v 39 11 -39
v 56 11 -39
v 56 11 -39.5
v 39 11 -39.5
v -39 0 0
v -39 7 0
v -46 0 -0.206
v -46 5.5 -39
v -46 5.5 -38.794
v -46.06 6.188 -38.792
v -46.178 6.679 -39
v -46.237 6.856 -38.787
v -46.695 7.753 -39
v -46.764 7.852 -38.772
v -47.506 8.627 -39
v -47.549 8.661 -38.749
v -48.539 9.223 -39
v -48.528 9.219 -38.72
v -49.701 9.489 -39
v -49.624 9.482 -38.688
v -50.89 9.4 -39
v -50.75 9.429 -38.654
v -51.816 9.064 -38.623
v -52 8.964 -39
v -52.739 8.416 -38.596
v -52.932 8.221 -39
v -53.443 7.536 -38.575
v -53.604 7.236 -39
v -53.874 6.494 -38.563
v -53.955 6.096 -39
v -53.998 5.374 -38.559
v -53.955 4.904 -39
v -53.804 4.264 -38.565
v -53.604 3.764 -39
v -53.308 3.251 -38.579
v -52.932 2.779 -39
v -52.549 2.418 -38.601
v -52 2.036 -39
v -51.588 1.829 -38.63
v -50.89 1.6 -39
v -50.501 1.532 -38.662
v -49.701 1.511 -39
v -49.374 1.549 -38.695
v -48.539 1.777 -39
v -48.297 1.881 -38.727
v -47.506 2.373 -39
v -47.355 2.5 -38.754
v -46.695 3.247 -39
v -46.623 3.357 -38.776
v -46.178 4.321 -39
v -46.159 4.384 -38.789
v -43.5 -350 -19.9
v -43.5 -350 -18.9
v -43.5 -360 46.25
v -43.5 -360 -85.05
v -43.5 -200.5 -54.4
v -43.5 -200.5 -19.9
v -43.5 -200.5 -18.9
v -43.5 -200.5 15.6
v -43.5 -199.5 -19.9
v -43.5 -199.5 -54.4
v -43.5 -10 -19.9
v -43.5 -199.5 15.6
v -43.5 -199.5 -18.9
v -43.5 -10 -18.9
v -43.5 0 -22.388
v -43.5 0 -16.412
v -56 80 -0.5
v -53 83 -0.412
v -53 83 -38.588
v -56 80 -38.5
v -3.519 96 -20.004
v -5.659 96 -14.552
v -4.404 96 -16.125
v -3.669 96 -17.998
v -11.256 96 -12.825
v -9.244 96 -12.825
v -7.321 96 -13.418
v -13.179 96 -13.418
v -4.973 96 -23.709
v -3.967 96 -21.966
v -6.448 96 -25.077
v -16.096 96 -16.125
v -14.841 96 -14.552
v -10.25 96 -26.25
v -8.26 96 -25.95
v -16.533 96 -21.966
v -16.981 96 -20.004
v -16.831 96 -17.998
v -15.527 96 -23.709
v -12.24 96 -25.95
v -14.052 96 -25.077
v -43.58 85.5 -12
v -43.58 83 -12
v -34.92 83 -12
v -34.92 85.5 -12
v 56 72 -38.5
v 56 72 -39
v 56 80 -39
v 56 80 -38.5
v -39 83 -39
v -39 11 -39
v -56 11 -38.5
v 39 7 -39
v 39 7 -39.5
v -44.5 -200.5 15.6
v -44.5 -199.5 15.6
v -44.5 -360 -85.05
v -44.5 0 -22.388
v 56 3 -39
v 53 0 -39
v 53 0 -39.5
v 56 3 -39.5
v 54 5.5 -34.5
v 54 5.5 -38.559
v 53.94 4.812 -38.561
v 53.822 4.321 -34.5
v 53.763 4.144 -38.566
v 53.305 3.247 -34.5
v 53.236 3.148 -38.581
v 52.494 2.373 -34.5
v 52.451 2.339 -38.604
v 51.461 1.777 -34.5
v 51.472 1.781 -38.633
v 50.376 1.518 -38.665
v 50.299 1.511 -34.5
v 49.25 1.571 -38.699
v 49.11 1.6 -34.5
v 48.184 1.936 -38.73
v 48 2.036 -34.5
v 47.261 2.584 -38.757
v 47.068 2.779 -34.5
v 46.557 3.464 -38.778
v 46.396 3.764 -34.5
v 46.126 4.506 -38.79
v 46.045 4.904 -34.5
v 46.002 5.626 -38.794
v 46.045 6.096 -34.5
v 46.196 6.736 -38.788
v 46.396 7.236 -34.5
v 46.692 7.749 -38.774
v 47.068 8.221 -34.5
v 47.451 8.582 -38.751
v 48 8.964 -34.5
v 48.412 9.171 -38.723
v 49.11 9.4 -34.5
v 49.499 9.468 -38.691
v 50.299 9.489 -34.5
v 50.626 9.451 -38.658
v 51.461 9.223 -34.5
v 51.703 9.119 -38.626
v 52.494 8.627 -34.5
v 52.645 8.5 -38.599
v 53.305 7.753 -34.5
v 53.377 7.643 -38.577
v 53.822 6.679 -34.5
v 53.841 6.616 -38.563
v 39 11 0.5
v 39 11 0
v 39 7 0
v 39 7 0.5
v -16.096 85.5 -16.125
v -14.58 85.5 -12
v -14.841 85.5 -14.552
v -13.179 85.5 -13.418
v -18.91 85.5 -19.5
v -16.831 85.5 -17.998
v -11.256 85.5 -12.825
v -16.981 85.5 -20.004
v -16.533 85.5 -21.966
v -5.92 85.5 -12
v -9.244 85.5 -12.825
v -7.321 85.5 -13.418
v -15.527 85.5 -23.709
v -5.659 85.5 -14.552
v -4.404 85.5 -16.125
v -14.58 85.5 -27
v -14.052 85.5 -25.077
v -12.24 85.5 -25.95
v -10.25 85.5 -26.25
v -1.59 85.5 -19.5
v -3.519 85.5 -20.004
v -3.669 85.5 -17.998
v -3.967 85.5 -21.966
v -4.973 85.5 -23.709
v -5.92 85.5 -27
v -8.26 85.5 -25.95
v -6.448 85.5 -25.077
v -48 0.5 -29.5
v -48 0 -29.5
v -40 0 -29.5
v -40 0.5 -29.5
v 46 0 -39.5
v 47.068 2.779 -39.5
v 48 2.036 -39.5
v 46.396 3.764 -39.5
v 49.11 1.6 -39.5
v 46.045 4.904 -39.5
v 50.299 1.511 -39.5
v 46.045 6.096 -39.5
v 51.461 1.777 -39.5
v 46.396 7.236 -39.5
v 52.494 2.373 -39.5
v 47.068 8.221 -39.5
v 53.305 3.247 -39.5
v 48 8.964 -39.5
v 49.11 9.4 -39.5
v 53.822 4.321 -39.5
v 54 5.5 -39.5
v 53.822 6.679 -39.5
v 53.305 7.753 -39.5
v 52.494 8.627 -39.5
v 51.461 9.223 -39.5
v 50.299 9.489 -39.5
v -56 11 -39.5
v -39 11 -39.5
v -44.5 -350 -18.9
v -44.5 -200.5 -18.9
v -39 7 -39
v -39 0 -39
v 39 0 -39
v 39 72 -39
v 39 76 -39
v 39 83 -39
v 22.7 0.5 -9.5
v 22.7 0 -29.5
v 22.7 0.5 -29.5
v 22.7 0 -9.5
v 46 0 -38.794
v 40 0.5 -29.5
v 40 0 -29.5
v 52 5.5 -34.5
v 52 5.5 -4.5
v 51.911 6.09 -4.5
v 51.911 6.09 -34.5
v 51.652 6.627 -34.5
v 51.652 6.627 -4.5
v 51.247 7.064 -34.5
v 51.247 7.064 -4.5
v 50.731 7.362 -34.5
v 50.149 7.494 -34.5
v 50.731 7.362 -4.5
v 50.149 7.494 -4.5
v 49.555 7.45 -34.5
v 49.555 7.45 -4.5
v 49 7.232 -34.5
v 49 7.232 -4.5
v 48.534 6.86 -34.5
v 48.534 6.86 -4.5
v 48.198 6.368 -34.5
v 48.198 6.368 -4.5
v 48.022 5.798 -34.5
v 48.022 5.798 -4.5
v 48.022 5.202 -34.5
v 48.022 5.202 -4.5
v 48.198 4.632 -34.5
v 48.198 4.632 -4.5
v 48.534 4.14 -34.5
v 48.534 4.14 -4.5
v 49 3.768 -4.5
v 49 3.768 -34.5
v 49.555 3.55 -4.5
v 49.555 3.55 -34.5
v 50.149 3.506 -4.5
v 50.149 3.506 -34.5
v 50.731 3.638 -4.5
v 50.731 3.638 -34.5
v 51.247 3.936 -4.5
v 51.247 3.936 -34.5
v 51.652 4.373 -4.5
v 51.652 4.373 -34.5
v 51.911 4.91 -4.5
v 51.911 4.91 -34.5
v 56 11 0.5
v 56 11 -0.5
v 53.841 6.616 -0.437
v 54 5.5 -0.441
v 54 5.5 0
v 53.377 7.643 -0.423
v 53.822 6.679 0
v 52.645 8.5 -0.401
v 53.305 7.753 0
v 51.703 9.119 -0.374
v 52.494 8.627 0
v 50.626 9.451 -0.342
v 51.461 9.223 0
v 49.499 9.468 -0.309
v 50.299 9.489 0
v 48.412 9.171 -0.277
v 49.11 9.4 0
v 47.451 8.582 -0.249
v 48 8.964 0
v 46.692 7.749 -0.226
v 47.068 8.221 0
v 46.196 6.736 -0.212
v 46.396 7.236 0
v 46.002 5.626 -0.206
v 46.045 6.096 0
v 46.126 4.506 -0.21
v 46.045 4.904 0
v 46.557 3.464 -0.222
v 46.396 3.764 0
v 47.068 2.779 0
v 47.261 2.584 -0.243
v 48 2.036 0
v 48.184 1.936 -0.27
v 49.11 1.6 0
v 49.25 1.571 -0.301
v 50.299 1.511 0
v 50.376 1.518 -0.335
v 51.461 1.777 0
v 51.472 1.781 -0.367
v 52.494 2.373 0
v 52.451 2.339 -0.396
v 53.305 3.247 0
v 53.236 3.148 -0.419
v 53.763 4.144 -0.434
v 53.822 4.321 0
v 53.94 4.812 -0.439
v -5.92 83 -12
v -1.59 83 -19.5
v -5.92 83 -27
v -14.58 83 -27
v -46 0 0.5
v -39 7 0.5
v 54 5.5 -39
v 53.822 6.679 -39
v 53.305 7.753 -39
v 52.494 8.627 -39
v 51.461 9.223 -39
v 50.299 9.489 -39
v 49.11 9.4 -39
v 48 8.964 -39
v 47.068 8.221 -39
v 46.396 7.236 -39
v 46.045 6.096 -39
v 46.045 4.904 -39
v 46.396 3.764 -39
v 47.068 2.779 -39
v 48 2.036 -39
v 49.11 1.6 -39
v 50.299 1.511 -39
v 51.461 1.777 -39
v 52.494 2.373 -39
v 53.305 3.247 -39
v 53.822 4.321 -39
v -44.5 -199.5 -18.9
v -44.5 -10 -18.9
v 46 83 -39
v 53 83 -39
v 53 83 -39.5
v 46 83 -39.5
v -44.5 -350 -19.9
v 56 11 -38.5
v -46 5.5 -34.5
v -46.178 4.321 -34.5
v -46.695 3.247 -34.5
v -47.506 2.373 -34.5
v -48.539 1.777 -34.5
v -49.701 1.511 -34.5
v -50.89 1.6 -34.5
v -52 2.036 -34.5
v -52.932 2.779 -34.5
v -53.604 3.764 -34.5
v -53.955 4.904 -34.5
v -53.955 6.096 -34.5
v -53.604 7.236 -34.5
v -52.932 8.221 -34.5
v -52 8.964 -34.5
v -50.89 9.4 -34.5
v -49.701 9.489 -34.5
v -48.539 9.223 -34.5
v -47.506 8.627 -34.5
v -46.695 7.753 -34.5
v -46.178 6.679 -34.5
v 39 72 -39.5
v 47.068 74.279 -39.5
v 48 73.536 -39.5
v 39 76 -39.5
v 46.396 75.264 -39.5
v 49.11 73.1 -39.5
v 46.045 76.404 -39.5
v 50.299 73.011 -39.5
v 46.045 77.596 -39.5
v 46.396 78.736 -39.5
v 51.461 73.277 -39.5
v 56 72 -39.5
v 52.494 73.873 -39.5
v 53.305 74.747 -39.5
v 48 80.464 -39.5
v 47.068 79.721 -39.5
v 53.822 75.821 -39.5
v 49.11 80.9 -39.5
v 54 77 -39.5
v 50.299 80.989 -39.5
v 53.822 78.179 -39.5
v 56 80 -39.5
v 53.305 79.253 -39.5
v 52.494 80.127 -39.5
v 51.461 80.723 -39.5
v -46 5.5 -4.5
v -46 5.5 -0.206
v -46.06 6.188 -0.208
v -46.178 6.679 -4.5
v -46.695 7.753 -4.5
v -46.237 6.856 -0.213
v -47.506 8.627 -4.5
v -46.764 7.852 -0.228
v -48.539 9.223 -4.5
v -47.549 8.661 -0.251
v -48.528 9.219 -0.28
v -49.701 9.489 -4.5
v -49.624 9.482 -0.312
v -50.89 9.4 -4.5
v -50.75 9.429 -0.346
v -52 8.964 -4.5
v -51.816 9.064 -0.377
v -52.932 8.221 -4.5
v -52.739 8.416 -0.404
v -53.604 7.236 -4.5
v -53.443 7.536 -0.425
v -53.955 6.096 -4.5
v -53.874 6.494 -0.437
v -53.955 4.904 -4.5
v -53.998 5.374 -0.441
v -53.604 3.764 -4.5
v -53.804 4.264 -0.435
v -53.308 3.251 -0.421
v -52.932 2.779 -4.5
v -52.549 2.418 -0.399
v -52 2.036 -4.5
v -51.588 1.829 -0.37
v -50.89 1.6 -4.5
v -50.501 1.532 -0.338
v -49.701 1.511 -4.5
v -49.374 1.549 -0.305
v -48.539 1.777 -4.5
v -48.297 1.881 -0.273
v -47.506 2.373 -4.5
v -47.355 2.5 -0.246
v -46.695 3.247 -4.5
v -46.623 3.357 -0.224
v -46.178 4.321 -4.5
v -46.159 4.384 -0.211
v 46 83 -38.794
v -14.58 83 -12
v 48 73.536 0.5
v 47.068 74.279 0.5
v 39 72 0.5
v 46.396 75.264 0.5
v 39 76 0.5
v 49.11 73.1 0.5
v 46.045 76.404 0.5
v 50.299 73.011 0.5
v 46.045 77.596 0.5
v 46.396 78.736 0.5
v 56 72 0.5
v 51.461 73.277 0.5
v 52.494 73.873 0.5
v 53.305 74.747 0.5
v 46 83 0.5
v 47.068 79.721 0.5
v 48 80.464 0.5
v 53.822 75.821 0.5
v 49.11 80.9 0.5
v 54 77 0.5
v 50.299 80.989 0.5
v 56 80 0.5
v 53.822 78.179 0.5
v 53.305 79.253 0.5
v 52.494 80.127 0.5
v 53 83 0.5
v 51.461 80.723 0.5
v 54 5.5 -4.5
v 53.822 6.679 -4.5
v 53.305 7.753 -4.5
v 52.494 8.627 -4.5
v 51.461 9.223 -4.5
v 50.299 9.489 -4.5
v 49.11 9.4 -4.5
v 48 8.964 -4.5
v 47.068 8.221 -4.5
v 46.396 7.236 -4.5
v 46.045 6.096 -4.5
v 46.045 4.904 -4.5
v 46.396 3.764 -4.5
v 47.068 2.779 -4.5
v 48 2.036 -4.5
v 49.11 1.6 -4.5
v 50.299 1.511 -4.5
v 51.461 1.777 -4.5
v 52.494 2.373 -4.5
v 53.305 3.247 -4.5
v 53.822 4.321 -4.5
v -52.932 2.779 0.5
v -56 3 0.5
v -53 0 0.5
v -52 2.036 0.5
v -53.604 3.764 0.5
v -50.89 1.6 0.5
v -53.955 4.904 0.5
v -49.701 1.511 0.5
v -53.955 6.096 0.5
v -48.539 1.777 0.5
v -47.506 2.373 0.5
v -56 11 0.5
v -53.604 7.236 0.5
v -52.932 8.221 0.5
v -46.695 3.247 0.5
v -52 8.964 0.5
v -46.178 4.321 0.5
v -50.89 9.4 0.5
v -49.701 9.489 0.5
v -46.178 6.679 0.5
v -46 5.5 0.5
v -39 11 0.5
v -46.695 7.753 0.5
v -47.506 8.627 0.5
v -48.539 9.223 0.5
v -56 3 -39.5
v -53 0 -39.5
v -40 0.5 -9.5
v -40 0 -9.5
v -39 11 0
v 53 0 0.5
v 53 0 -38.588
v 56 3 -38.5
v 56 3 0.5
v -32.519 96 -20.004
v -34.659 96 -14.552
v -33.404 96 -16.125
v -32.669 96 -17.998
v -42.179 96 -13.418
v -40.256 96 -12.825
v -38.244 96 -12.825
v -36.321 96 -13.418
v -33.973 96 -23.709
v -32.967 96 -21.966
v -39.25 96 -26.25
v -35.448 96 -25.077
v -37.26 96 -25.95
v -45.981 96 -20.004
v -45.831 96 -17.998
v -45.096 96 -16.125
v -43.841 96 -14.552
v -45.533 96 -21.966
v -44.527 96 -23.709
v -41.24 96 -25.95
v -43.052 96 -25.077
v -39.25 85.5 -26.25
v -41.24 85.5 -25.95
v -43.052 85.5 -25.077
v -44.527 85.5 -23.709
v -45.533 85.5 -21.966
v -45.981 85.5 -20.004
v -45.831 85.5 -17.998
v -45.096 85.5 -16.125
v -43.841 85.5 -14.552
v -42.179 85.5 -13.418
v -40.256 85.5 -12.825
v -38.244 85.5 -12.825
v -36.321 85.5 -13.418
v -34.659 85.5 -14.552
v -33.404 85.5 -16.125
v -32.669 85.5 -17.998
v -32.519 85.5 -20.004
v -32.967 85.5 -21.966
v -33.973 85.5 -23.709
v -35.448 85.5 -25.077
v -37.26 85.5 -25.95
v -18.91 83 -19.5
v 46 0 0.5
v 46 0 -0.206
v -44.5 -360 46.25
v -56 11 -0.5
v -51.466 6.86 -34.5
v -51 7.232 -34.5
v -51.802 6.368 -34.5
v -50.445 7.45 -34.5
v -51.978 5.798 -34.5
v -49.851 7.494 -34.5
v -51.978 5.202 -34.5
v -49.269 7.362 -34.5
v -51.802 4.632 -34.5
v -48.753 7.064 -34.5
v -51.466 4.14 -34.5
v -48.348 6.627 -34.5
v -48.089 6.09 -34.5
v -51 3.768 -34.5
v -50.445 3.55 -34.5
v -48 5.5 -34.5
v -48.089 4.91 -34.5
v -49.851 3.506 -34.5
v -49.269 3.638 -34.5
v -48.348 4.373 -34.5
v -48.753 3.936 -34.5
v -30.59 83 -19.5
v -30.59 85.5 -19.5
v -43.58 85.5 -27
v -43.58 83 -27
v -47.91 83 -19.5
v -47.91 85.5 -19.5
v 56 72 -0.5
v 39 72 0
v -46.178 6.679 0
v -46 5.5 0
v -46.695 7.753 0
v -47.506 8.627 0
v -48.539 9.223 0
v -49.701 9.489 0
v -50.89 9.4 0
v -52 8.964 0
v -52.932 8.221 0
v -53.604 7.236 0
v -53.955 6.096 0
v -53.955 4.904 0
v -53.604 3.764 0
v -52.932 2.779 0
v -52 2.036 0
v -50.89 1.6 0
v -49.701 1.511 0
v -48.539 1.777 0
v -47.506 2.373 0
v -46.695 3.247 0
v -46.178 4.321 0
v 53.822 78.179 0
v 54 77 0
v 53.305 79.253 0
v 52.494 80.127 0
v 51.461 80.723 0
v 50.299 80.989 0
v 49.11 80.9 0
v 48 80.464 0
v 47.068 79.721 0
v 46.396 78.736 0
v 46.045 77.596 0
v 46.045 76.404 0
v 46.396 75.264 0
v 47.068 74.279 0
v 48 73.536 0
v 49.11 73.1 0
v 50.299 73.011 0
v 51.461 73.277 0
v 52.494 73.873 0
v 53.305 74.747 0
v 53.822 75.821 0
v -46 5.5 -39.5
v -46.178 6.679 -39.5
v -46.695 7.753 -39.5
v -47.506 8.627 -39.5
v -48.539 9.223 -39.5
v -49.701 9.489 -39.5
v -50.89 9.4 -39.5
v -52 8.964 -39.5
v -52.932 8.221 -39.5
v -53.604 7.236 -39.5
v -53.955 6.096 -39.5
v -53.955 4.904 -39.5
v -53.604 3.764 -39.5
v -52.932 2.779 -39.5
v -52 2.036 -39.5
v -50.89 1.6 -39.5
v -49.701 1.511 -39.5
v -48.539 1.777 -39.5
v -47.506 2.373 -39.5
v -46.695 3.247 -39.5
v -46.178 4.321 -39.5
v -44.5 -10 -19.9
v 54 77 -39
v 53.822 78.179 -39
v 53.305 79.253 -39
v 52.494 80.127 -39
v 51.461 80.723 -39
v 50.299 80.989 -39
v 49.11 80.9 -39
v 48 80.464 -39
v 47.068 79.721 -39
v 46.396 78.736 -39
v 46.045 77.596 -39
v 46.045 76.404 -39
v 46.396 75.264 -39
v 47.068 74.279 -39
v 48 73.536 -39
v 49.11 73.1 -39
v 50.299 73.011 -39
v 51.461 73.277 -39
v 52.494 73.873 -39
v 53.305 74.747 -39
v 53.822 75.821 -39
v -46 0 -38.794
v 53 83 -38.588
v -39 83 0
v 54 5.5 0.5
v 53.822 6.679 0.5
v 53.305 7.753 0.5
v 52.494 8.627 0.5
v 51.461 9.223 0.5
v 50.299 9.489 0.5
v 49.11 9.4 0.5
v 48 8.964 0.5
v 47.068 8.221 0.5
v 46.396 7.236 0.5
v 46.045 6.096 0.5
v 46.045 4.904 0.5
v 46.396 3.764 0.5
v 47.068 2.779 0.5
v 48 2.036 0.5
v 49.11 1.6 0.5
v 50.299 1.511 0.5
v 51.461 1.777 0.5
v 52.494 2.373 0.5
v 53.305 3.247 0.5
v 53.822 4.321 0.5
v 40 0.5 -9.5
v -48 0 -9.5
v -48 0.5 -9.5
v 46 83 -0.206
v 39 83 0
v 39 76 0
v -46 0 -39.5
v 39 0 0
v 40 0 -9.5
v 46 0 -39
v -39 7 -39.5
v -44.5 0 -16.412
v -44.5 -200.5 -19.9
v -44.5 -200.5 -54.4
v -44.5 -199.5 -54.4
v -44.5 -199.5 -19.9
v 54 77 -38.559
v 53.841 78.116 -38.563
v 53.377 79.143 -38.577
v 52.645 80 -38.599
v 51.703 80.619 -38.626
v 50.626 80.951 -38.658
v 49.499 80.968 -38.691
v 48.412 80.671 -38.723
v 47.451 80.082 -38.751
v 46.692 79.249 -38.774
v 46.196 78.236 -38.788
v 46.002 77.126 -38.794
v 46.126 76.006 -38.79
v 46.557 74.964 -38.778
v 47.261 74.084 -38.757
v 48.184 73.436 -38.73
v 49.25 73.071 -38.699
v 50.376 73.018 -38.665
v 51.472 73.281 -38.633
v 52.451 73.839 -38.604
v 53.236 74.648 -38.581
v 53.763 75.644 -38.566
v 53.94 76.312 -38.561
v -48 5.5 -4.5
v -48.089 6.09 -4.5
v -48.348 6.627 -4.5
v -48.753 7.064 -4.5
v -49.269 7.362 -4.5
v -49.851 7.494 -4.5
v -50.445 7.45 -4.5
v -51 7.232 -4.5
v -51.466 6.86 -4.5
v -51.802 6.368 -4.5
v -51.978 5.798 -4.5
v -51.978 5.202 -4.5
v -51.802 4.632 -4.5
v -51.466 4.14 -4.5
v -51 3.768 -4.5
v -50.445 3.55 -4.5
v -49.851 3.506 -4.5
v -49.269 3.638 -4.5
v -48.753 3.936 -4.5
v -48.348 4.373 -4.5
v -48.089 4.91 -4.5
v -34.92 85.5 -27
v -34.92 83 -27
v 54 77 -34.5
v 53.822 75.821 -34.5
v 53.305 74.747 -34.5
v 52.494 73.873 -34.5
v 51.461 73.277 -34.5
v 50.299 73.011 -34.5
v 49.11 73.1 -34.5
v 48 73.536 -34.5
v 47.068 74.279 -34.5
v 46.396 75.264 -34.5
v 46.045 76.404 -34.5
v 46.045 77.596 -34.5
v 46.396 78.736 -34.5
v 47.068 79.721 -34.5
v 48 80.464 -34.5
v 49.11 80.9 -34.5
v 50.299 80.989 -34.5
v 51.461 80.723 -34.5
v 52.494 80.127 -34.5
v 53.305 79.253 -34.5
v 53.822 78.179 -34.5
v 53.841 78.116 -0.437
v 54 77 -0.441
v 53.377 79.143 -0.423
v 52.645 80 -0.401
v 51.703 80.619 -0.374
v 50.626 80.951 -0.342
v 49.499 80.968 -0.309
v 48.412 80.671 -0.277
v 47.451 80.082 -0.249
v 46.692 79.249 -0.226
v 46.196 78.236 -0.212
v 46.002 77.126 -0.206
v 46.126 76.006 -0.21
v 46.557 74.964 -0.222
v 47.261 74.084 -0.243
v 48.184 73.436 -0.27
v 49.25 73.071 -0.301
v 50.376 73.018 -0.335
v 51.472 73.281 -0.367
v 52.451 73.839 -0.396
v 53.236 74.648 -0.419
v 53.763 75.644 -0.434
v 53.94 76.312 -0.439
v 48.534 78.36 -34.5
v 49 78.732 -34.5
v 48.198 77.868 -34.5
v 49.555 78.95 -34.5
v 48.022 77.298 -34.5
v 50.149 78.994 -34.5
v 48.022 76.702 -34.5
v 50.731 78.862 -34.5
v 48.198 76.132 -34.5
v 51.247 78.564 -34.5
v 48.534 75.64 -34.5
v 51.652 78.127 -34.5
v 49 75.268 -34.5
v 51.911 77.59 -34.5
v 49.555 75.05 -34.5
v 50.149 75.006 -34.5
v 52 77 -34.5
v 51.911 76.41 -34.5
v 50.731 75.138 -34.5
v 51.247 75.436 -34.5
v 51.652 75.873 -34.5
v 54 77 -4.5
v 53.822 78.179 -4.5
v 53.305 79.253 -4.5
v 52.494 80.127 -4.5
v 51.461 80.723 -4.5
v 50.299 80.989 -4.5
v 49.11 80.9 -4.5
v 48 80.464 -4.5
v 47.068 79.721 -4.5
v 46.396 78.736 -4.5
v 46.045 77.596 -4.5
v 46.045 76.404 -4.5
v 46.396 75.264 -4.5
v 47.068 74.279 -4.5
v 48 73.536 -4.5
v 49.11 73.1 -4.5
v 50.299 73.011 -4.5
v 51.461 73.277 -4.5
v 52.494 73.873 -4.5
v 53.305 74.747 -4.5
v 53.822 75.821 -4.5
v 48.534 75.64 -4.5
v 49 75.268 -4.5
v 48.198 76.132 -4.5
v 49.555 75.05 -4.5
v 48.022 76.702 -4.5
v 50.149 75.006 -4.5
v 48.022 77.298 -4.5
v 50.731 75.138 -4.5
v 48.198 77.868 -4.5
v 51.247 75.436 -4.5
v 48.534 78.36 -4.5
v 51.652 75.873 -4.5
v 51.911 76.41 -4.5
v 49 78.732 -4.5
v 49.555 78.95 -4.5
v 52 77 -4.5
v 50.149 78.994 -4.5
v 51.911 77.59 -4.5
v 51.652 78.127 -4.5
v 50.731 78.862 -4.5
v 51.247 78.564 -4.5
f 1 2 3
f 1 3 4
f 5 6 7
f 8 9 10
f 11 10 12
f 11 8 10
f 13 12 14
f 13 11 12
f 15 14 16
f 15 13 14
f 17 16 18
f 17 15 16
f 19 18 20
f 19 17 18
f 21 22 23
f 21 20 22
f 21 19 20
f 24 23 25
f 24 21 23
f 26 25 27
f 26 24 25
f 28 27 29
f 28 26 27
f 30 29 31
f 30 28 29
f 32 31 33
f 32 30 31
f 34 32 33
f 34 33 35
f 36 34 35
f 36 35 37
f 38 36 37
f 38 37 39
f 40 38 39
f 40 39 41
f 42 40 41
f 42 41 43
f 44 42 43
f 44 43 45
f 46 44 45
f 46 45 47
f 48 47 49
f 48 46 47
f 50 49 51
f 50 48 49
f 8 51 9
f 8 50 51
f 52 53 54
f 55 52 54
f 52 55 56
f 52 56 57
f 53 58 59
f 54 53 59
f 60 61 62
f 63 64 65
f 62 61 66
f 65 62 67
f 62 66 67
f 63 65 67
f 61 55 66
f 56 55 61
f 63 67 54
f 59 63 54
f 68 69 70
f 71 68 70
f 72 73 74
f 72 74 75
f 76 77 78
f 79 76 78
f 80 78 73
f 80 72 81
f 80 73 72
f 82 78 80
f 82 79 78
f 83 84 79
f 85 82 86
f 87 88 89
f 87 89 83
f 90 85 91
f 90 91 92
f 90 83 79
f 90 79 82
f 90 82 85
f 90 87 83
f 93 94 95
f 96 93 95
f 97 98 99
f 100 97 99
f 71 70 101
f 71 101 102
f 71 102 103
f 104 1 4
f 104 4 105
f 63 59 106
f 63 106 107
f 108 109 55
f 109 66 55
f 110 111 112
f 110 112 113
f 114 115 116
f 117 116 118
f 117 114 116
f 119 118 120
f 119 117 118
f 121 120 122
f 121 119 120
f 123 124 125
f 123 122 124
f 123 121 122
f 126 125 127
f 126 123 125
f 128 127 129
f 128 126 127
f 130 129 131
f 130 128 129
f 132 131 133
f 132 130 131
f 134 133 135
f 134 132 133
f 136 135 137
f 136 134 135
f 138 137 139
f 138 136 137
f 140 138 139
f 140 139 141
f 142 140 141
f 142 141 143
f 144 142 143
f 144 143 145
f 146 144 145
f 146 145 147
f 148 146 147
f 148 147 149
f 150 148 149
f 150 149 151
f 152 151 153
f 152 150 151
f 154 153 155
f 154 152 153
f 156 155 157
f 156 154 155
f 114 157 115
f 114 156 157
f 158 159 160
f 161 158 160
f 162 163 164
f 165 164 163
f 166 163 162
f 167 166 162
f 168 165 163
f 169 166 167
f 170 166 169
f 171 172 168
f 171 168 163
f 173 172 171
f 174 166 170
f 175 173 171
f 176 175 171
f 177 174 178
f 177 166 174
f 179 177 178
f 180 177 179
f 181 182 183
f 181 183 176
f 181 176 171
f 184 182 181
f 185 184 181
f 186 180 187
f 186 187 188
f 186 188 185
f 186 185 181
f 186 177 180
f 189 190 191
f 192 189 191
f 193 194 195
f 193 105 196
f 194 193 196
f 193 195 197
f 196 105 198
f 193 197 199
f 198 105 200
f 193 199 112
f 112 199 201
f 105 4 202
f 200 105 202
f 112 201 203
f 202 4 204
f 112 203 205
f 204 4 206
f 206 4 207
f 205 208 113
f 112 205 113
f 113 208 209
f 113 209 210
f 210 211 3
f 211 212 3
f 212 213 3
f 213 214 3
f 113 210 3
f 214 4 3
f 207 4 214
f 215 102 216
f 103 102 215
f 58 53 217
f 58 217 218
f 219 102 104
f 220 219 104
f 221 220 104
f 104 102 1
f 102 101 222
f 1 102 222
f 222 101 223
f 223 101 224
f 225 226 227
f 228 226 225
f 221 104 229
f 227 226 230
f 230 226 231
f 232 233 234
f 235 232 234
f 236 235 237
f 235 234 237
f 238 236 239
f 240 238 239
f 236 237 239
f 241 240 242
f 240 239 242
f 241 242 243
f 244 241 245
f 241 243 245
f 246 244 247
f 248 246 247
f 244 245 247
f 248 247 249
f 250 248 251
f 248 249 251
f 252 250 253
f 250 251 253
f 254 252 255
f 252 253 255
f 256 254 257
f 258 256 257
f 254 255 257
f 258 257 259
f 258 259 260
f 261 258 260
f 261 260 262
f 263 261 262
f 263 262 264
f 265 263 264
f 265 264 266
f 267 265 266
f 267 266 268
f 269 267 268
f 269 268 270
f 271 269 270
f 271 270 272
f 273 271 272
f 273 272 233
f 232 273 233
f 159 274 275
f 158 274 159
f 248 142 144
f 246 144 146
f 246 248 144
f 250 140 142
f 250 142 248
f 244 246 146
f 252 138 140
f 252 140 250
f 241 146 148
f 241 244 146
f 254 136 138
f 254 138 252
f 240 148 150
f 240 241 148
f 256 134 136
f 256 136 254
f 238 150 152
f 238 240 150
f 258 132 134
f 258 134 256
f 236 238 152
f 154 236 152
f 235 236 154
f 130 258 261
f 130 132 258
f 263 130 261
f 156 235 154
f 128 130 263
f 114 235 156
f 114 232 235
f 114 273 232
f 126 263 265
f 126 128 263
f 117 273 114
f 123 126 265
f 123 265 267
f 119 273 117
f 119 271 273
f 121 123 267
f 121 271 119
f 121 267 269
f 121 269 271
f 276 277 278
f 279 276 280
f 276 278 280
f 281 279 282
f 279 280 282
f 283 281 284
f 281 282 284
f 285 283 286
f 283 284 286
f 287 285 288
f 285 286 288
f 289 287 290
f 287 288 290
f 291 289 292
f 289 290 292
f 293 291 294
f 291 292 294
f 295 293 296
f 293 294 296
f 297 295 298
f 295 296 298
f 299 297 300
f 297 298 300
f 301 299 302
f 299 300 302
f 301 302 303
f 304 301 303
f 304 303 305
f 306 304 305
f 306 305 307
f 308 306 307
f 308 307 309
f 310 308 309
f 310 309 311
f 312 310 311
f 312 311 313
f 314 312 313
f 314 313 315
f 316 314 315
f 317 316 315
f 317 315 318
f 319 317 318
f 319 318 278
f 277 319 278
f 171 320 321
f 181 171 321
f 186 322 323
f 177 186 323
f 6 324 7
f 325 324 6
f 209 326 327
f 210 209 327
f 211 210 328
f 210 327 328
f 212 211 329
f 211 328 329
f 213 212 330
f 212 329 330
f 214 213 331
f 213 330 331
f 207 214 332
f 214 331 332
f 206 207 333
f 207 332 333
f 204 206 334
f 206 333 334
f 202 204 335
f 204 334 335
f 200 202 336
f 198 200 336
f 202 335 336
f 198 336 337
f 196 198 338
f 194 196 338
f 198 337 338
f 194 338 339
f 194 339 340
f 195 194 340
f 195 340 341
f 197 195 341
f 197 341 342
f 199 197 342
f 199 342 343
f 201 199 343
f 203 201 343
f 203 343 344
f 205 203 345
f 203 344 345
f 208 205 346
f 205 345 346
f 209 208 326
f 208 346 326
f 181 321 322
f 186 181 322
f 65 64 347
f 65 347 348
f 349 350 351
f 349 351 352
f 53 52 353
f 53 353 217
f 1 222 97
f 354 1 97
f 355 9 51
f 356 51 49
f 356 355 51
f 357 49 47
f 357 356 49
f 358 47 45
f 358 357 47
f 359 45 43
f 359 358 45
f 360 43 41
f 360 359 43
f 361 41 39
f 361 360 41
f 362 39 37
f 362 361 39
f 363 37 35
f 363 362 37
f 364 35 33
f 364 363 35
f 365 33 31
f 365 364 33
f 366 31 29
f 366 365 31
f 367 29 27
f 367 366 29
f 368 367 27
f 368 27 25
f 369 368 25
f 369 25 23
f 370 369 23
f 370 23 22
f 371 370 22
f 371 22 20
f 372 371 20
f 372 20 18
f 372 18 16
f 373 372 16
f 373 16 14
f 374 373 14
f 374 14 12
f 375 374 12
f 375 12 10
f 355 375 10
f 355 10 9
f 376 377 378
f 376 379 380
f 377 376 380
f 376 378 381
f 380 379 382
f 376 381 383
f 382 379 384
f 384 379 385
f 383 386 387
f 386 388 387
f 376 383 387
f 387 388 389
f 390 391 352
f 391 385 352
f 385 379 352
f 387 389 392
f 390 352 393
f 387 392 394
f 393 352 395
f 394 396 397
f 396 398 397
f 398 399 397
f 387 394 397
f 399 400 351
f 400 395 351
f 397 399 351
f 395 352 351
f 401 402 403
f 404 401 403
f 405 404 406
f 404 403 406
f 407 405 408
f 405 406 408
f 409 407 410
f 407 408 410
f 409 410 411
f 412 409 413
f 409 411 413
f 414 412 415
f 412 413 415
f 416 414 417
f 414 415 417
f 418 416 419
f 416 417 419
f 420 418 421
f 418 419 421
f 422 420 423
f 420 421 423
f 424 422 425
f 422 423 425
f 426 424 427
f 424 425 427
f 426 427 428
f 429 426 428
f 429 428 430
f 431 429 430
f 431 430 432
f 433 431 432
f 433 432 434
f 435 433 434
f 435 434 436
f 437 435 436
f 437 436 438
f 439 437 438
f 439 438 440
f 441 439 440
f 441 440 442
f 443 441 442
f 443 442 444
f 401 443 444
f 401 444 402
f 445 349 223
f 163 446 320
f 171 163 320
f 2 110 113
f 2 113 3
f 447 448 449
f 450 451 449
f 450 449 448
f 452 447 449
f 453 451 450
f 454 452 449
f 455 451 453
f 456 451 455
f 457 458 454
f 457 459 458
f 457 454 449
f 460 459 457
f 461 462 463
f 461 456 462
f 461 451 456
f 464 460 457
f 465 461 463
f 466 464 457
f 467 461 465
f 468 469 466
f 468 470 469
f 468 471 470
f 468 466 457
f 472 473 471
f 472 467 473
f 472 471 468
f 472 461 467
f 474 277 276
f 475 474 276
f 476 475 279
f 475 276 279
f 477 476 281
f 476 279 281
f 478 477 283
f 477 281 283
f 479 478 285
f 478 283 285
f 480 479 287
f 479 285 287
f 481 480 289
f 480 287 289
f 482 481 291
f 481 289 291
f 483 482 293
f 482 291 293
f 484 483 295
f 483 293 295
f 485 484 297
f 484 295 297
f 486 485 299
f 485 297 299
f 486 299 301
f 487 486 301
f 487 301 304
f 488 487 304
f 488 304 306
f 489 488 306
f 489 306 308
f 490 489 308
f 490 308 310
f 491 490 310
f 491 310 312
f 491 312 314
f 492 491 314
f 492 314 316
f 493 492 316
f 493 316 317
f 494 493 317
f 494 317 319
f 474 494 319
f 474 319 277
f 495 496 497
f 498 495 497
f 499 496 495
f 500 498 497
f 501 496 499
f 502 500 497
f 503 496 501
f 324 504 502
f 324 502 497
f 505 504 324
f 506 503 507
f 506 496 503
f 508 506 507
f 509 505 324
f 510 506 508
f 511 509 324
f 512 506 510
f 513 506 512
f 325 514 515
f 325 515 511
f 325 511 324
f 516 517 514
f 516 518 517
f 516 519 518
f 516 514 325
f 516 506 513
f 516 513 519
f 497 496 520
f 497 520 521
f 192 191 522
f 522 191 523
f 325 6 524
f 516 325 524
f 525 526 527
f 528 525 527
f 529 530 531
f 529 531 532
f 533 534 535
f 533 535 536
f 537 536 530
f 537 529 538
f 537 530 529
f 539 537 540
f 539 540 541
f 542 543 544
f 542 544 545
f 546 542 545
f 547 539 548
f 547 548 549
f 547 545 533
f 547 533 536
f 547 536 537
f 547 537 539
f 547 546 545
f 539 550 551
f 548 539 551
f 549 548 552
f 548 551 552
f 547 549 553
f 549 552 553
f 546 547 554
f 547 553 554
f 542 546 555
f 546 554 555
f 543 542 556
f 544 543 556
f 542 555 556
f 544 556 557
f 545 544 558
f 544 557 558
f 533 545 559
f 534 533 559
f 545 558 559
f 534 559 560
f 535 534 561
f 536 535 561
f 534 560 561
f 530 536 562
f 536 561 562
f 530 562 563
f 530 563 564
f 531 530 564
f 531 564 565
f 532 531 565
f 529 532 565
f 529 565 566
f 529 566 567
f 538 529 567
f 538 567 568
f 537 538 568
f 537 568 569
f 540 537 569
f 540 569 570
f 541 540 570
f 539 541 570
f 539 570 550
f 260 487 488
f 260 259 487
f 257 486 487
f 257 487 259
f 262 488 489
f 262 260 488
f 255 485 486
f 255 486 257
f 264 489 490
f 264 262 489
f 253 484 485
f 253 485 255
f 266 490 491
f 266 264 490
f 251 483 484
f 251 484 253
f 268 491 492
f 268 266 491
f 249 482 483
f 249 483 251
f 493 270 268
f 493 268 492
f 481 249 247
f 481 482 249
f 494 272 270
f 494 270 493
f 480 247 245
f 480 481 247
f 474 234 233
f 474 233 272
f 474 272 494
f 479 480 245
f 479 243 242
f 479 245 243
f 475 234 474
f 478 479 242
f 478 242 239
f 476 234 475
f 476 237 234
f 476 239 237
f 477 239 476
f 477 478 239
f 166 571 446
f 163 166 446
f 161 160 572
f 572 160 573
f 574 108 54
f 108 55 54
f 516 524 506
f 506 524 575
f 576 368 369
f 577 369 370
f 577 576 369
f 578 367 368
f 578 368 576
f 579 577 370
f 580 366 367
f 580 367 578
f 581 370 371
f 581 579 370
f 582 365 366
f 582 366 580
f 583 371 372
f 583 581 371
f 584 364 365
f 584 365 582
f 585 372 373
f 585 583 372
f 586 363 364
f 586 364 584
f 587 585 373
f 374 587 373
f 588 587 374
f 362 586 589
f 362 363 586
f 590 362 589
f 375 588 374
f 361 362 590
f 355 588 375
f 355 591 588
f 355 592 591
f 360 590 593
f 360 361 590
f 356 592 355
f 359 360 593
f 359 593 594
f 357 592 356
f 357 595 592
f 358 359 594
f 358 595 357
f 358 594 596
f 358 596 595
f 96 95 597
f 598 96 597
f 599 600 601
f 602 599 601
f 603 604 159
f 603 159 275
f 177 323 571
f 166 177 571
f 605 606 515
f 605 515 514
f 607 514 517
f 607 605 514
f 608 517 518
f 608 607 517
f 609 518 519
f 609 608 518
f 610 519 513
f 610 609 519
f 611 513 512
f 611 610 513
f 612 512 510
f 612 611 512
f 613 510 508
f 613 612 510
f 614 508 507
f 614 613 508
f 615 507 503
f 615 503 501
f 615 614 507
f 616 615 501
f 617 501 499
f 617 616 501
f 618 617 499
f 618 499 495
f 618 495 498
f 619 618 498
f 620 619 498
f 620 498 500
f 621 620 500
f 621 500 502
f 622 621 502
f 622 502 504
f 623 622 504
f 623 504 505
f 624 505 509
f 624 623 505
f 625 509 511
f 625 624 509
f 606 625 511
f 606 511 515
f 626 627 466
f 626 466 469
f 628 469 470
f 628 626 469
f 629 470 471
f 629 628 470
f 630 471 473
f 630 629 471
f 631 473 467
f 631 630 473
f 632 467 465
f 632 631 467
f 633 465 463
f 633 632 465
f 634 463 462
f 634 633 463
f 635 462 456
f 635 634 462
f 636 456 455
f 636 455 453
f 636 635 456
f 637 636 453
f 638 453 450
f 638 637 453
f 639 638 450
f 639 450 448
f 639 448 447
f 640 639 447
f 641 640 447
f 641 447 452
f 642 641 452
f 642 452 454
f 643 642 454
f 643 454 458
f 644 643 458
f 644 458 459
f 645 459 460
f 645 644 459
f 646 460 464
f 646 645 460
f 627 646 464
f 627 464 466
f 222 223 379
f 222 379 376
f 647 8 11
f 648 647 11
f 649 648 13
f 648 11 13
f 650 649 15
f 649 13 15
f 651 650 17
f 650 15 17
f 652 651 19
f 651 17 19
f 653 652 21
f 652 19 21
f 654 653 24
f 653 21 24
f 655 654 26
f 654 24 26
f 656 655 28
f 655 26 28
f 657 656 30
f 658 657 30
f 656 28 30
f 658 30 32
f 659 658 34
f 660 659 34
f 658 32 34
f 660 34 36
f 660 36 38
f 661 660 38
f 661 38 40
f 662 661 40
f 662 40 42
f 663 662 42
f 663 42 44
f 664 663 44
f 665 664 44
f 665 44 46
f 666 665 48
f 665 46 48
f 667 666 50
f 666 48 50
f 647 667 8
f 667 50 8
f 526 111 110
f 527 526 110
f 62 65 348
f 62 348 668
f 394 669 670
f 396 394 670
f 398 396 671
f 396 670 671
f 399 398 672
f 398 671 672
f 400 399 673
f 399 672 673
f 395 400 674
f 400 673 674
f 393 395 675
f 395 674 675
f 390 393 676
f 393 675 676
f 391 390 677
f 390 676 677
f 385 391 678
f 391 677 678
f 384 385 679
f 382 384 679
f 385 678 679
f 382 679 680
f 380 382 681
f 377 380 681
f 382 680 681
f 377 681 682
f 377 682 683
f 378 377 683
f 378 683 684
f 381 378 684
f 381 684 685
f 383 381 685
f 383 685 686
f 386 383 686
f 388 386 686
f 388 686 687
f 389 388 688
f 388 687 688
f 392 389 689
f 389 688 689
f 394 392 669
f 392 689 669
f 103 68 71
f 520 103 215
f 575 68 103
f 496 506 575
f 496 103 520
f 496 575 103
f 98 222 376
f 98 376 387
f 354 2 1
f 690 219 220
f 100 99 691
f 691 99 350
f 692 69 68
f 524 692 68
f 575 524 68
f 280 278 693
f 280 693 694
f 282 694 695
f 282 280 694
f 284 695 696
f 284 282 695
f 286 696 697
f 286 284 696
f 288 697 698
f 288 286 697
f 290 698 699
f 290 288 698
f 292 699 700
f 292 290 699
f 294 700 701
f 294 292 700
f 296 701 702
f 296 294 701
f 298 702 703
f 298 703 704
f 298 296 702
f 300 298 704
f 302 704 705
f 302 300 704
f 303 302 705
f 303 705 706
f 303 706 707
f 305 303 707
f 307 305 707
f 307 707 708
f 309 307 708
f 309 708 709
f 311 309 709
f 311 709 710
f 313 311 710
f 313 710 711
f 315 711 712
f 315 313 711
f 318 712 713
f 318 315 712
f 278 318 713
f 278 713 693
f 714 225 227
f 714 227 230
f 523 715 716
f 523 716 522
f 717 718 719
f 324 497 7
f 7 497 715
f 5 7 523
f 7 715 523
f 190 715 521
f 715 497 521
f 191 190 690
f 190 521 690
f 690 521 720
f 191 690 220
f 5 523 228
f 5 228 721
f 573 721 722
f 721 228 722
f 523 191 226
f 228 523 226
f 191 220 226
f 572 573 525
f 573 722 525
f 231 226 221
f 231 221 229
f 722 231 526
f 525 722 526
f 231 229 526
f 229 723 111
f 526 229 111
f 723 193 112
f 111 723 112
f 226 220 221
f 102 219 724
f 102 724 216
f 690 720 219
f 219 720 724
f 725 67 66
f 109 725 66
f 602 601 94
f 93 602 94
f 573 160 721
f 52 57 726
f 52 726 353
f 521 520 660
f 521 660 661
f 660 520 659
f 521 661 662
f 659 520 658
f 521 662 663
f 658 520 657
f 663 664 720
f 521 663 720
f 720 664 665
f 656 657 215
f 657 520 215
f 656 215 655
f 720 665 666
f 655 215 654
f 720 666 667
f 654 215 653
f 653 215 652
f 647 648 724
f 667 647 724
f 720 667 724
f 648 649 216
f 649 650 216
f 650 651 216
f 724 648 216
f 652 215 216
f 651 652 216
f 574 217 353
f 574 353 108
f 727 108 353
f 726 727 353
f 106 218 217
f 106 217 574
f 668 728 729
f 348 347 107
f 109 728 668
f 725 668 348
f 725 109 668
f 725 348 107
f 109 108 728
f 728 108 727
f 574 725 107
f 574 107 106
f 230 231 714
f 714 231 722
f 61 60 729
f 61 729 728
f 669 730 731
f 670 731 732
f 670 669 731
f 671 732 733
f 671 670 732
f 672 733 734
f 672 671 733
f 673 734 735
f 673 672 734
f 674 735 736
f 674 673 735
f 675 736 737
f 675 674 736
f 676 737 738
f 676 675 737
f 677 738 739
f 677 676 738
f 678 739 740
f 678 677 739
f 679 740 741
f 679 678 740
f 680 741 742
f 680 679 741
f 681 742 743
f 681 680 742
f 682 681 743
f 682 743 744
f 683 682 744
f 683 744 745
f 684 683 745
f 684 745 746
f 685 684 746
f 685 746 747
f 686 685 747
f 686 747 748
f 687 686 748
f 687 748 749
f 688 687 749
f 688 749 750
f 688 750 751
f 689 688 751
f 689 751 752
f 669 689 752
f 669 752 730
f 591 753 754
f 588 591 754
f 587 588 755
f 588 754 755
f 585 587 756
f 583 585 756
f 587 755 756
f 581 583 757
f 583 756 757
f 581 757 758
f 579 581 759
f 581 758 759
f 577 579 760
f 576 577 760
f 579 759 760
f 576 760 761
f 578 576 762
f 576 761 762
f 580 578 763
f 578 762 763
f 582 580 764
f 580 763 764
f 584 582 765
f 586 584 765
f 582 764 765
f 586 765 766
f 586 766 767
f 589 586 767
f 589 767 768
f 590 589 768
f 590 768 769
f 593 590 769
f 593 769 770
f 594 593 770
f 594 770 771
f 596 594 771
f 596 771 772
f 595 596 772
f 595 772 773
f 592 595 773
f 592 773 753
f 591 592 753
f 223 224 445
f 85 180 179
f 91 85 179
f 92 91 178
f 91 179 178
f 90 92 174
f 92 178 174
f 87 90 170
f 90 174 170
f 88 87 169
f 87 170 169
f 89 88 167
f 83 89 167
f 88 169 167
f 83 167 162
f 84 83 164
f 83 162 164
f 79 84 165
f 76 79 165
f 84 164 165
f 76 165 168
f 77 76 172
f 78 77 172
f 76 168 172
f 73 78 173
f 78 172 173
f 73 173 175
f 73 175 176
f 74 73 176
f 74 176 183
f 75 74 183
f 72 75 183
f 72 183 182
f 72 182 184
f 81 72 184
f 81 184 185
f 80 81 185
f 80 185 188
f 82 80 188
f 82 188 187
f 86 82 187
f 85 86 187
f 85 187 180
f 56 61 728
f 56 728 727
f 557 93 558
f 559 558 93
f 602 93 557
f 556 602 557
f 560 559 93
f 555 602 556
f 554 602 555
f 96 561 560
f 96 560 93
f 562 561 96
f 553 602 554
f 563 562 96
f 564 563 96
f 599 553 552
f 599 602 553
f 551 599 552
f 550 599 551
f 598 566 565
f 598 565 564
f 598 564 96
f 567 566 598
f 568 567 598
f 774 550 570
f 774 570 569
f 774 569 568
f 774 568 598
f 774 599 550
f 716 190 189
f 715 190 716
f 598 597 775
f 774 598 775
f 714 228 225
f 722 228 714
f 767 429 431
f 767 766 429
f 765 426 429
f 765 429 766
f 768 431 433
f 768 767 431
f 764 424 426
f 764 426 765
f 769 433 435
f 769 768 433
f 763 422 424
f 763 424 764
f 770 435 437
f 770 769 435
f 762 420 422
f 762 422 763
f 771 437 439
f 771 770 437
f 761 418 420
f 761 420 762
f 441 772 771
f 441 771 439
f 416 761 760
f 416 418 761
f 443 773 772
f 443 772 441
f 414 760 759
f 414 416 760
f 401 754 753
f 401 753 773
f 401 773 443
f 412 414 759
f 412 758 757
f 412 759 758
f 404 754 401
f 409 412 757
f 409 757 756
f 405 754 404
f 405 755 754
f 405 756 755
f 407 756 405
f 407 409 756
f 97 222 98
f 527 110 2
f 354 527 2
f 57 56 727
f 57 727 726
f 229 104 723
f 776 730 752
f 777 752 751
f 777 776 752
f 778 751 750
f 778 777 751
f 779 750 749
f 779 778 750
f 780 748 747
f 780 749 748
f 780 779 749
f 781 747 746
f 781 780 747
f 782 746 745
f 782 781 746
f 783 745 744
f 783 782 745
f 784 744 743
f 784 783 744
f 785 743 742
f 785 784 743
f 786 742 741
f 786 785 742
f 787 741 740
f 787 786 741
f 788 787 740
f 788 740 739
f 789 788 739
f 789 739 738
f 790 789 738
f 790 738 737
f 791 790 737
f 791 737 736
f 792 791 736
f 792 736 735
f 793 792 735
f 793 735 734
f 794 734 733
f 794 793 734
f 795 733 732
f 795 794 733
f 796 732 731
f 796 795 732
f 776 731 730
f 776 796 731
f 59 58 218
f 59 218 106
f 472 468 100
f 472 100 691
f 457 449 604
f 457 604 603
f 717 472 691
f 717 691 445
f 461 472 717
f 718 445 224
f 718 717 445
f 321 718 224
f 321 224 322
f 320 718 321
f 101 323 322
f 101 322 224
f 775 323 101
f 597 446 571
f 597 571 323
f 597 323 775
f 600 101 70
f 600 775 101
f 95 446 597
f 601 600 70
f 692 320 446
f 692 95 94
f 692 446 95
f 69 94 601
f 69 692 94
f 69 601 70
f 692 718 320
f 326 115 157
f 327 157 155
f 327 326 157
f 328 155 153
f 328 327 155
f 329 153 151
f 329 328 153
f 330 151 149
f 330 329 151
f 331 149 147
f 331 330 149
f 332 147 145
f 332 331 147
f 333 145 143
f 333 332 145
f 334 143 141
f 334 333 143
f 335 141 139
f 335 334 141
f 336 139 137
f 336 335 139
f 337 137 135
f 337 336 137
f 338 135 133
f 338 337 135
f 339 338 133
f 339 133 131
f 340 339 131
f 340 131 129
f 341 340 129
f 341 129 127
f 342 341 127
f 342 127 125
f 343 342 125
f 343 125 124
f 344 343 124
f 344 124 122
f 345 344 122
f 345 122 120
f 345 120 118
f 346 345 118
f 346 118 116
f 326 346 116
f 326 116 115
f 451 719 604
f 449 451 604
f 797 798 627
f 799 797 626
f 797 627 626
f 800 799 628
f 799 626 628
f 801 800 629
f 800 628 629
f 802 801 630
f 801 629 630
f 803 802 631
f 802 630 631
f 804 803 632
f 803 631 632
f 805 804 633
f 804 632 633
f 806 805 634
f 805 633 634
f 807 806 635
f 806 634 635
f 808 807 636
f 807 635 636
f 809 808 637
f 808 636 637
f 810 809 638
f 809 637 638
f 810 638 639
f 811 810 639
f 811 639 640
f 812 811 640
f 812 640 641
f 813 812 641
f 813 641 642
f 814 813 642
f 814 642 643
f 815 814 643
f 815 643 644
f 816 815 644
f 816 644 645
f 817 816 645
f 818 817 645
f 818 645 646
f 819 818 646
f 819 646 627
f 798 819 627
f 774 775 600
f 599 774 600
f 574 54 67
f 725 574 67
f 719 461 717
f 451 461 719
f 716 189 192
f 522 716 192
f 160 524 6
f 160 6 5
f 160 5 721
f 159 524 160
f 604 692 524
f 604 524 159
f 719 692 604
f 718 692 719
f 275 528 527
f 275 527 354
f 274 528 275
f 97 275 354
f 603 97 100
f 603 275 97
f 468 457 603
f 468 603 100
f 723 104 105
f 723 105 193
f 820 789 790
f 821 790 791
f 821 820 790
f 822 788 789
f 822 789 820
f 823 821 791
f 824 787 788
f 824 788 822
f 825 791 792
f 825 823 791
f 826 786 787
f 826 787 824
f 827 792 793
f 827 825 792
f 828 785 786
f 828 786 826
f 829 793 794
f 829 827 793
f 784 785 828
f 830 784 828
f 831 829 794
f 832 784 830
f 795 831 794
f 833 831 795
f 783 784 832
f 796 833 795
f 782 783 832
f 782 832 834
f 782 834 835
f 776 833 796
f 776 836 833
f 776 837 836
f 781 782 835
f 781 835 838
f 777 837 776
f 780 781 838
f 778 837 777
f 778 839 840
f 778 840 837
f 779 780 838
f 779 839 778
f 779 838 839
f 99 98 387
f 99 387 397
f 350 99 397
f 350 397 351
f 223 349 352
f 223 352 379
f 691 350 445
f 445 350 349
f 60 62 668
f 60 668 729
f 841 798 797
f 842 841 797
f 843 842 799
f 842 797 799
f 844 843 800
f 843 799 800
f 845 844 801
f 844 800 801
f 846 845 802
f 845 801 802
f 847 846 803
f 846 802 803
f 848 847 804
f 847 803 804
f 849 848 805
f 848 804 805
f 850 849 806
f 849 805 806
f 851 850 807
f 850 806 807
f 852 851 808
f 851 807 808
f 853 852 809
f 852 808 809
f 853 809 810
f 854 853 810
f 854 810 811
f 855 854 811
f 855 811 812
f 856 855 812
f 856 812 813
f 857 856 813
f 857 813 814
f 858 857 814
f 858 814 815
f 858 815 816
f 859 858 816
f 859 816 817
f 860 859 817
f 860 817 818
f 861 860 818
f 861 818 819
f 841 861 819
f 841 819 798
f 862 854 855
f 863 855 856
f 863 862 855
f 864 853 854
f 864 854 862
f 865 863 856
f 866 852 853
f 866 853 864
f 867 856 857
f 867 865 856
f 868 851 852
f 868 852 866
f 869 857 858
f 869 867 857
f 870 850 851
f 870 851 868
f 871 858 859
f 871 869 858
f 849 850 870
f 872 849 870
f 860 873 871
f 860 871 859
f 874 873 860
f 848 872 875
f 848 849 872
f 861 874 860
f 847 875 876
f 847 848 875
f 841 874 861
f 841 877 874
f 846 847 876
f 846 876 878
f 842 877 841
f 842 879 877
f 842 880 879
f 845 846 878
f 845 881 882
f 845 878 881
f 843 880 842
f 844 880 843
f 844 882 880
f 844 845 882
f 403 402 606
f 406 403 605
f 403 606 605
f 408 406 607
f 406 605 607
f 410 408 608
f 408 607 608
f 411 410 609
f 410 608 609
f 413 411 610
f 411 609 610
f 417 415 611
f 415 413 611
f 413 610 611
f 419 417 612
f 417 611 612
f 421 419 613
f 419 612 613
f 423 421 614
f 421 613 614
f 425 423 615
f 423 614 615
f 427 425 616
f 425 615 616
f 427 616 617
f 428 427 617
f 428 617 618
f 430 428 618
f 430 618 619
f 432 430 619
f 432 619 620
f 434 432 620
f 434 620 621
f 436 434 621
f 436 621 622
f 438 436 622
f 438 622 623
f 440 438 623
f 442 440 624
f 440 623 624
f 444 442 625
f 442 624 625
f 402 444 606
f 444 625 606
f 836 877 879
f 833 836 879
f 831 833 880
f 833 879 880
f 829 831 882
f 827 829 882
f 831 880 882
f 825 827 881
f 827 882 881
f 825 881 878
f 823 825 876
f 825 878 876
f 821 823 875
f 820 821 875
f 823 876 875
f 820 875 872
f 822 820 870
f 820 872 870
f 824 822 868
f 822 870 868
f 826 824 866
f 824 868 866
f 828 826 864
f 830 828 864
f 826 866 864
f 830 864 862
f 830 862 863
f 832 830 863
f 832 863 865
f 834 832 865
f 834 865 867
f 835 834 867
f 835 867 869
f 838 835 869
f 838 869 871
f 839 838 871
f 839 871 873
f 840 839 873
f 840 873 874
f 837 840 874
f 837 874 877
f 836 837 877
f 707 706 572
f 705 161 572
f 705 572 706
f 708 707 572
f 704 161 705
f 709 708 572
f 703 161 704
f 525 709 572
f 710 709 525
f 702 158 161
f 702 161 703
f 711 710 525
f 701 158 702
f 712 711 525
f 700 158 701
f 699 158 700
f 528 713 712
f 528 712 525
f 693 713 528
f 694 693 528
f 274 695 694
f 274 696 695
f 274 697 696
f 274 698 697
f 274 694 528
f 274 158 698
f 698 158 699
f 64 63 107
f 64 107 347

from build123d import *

# Parameters (mm, degrees)
SKICA1_W                            = 112
SKICA1_H                            = 83
P_IDAT_VYSUNUT_M1_DEPTH             = 39
SKICA2_R                            = 2
ODEBRAT_VYSUNUT_M1_DEPTH            = 108.452315005
SKICA3_R                            = 4
ODEBRAT_VYSUNUT_M2_DEPTH            = 4.5
ODEBRAT_START                       = -4.5
SKICA4_R                            = 4
ODEBRAT_VYSUNUT_M3_DEPTH            = 4.5
ZKOSEN_1_SIZE                       = 3
SKICA5_R                            = 6.75
P_IDAT_VYSUNUT_M2_DEPTH             = 13
P_IDAT_VYSUNUT_M3_DEPTH             = 2.5
SKICA7_W                            = 17.3
SKICA7_H                            = 20
SKICA7_W_2                          = 8
ODEBRAT_VYSUNUT_M4_DEPTH            = 0.5
ODEBRAT_VYSUNUT_M5_DEPTH            = 108.452315005
SKICA10_R                           = 4
P_IDAT_VYSUNUT_M4_DEPTH             = 0.5
P_IDAT_VYSUNUT_M4_DIRECTION_2_REACH = 119.784
P_IDAT_VYSUNUT_M5_DEPTH             = 0.5
ODEBRAT_VYSUNUT_M6_DEPTH            = 384.319387065
ODEBRAT_VYSUNUT_M6_DEPTH_BACK       = 384.319387065


with BuildPart() as part:
    # Skica1 → Přidat vysunutím1 (new body)
    with BuildSketch(Plane.XY):
        with Locations((0, 41.5)):
            Rectangle(SKICA1_W, SKICA1_H)
    extrude(amount=-P_IDAT_VYSUNUT_M1_DEPTH)

    # Skica2 → Odebrat vysunutím1 (cut, through all)
    with BuildSketch(Plane.XY):
        with Locations((50, 77)):
            Circle(SKICA2_R)
        with Locations((-50, 5.5)):
            Circle(SKICA2_R)
        with Locations((50, 5.5)):
            Circle(SKICA2_R)
    extrude(amount=-ODEBRAT_VYSUNUT_M1_DEPTH, mode=Mode.SUBTRACT)

    # Skica3 → Odebrat vysunutím2 (cut)
    with BuildSketch(Plane.XY):
        with Locations((50, 77)):
            Circle(SKICA3_R)
        with Locations((50, 5.5)):
            Circle(SKICA3_R)
        with Locations((-50, 5.5)):
            Circle(SKICA3_R)
    extrude(amount=-ODEBRAT_VYSUNUT_M2_DEPTH, mode=Mode.SUBTRACT)

    # Skica4 → Odebrat vysunutím3 (cut)
    with BuildSketch(Plane(origin=(0, 0, -39), x_dir=(-1, 0, 0), z_dir=(0, 0, -1)).offset(ODEBRAT_START)):
        with Locations(Location((-50, 77, 0), (0, 0, 180))):
            Circle(SKICA4_R)
        with Locations(Location((-50, 5.5, 0), (0, 0, 180))):
            Circle(SKICA4_R)
        with Locations(Location((50, 5.5, 0), (0, 0, 180))):
            Circle(SKICA4_R)
    extrude(amount=ODEBRAT_VYSUNUT_M3_DEPTH, mode=Mode.SUBTRACT)

    # Zkosení1
    zkosen_1_edges = [part.edges().sort_by_distance(p)[0] for p in [
        (-56, 83, -19.5),
        (56, 83, -19.5),
        (56, 0, -19.5),
        (-56, 0, -19.5),
    ]]
    chamfer(zkosen_1_edges, length=ZKOSEN_1_SIZE)

    # Skica5 → Přidat vysunutím2 (add)
    with BuildSketch(Plane(origin=(0, 83, 0), x_dir=(1, 0, 0), z_dir=(0, 1, 0))):
        with Locations(Location((-39.25, 19.5, 0), (0, 0, 90))):
            Circle(SKICA5_R)
        with Locations(Location((-10.25, 19.5, 0), (0, 0, 90))):
            Circle(SKICA5_R)
    extrude(amount=P_IDAT_VYSUNUT_M2_DEPTH)

    # Skica6 → Přidat vysunutím3 (add)
    with BuildSketch(Plane(origin=(0, 83, 0), x_dir=(1, 0, 0), z_dir=(0, 1, 0))):
        Polygon((-34.919872981, 27), (-43.580127019, 27), (-47.910254038, 19.5), (-43.580127019, 12), (-34.919872981, 12), (-30.589745962, 19.5), align=None)
        Polygon((-5.919872981, 27), (-14.580127019, 27), (-18.910254038, 19.5), (-14.580127019, 12), (-5.919872981, 12), (-1.589745962, 19.5), align=None)
    extrude(amount=P_IDAT_VYSUNUT_M3_DEPTH)

    # Skica7 → Odebrat vysunutím4 (cut)
    with BuildSketch(Plane.XZ):
        with Locations((31.35, -19.5)):
            Rectangle(SKICA7_W, SKICA7_H)
        with Locations((-44, -19.5)):
            Rectangle(SKICA7_W_2, SKICA7_H)
    extrude(amount=-ODEBRAT_VYSUNUT_M4_DEPTH, mode=Mode.SUBTRACT)

    # Skica8 → Odebrat vysunutím5 (cut, through all)
    with BuildSketch(Plane(origin=(0, 83, 0), x_dir=(1, 0, 0), z_dir=(0, 1, 0))):
        Polygon((-39, 39), (-56, 38.5), (-56, 39), align=None)
        Polygon((-56, 0), (-39, 0), (-56, 0.5), align=None)
        Polygon((39, 0), (56, 0.5), (56, 0), align=None)
        Polygon((56, 39), (39, 39), (56, 38.5), align=None)
    extrude(amount=-ODEBRAT_VYSUNUT_M5_DEPTH, mode=Mode.SUBTRACT)

    # Skica10 → Přidat vysunutím4 (add)
    # profile 1 of 3: a face of its own
    with BuildSketch(Plane.XY):
        Polygon((-46, 0), (-39, 7), (-39, 11), (-56, 11), (-56, 3), (-53, 0), align=None)
        with Locations((-50, 5.5)):
            Circle(SKICA10_R, mode=Mode.SUBTRACT)
    # profile 2 of 3: a face of its own
    with BuildSketch(Plane.XY):
        Polygon((56, 3), (56, 11), (39, 11), (39, 7), (46, 0), (53, 0), align=None)
        with Locations((50, 5.5)):
            Circle(SKICA10_R, mode=Mode.SUBTRACT)
    # profile 3 of 3: a face of its own
    with BuildSketch(Plane.XY):
        Polygon((56, 80), (53, 83), (46, 83), (39, 76), (39, 72), (56, 72), align=None)
        with Locations((50, 77)):
            Circle(SKICA10_R, mode=Mode.SUBTRACT)
    p_idat_vysunut_m4 = extrude(amount=P_IDAT_VYSUNUT_M4_DEPTH)

    # Skica10 → Přidat vysunutím4 direction 2 (add, up to next)
    with BuildSketch(Plane.XY, mode=Mode.PRIVATE) as p_idat_vysunut_m4_direction_2_sk1:
        Polygon((-46, 0), (-39, 7), (-39, 11), (-56, 11), (-56, 3), (-53, 0), align=None)
        with Locations((-50, 5.5)):
            Circle(SKICA10_R, mode=Mode.SUBTRACT)
    p_idat_vysunut_m4_direction_2_tool1 = extrude(p_idat_vysunut_m4_direction_2_sk1.sketch, amount=-P_IDAT_VYSUNUT_M4_DIRECTION_2_REACH, mode=Mode.PRIVATE) - part.part
    # Skica10 → Přidat vysunutím4 direction 2 (add, up to next)
    with BuildSketch(Plane.XY, mode=Mode.PRIVATE) as p_idat_vysunut_m4_direction_2_sk2:
        Polygon((56, 3), (56, 11), (39, 11), (39, 7), (46, 0), (53, 0), align=None)
        with Locations((50, 5.5)):
            Circle(SKICA10_R, mode=Mode.SUBTRACT)
    p_idat_vysunut_m4_direction_2_tool2 = extrude(p_idat_vysunut_m4_direction_2_sk2.sketch, amount=-P_IDAT_VYSUNUT_M4_DIRECTION_2_REACH, mode=Mode.PRIVATE) - part.part
    # Skica10 → Přidat vysunutím4 direction 2 (add, up to next)
    with BuildSketch(Plane.XY, mode=Mode.PRIVATE) as p_idat_vysunut_m4_direction_2_sk3:
        Polygon((56, 80), (53, 83), (46, 83), (39, 76), (39, 72), (56, 72), align=None)
        with Locations((50, 77)):
            Circle(SKICA10_R, mode=Mode.SUBTRACT)
    p_idat_vysunut_m4_direction_2_tool3 = extrude(p_idat_vysunut_m4_direction_2_sk3.sketch, amount=-P_IDAT_VYSUNUT_M4_DIRECTION_2_REACH, mode=Mode.PRIVATE) - part.part
    p_idat_vysunut_m4_direction_2_1 = p_idat_vysunut_m4_direction_2_tool1.solids().sort_by_distance((-49.5, 0.202485, 0))[0]
    add(p_idat_vysunut_m4_direction_2_1)
    p_idat_vysunut_m4_direction_2_2 = p_idat_vysunut_m4_direction_2_tool2.solids().sort_by_distance((55.797515, 7, 0))[0]
    add(p_idat_vysunut_m4_direction_2_2)
    p_idat_vysunut_m4_direction_2_3 = p_idat_vysunut_m4_direction_2_tool3.solids().sort_by_distance((54.356822, 81.356822, 0))[0]
    add(p_idat_vysunut_m4_direction_2_3)
    p_idat_vysunut_m4_direction_2 = p_idat_vysunut_m4_direction_2_1 + p_idat_vysunut_m4_direction_2_2 + p_idat_vysunut_m4_direction_2_3  # Přidat vysunutím4 direction 2 as one shape, for the pattern or mirror that repeats it

    # Zrcadlit1: Přidat vysunutím4, Přidat vysunutím4 direction 2 across plane
    add(p_idat_vysunut_m4.mirror(Plane.XY.offset(-19.5)))
    add(p_idat_vysunut_m4_direction_2.mirror(Plane.XY.offset(-19.5)))


with BuildPart() as body_2:
    # Skica11 → Přidat vysunutím5 (new, symmetric)
    with BuildSketch(Plane(origin=(-44, 0, -44), x_dir=(0, 0, -1), z_dir=(1, 0, 0))):
        Polygon((-27.5875, 0), (-21.6125, 0), (41.05, -360), (-90.25, -360), align=None)
    extrude(amount=P_IDAT_VYSUNUT_M5_DEPTH, both=True)

    # Skica12 → Odebrat vysunutím6 (cut, two sides: drawn at the far end of the back side and taken through both)
    with BuildSketch(Plane.ZY.offset(44.5).offset(-ODEBRAT_VYSUNUT_M6_DEPTH_BACK)):
        Polygon((-54.4, -200.5), (-19.9, -200.5), (-19.9, -350), (-18.9, -350), (-18.9, -200.5), (15.6, -200.5), (15.6, -199.5), (-18.9, -199.5), (-18.9, -10), (-19.9, -10), (-19.9, -199.5), (-54.4, -199.5), align=None)
    extrude(amount=ODEBRAT_VYSUNUT_M6_DEPTH + ODEBRAT_VYSUNUT_M6_DEPTH_BACK, mode=Mode.SUBTRACT)


solid = Compound([part.part, body_2.part])
